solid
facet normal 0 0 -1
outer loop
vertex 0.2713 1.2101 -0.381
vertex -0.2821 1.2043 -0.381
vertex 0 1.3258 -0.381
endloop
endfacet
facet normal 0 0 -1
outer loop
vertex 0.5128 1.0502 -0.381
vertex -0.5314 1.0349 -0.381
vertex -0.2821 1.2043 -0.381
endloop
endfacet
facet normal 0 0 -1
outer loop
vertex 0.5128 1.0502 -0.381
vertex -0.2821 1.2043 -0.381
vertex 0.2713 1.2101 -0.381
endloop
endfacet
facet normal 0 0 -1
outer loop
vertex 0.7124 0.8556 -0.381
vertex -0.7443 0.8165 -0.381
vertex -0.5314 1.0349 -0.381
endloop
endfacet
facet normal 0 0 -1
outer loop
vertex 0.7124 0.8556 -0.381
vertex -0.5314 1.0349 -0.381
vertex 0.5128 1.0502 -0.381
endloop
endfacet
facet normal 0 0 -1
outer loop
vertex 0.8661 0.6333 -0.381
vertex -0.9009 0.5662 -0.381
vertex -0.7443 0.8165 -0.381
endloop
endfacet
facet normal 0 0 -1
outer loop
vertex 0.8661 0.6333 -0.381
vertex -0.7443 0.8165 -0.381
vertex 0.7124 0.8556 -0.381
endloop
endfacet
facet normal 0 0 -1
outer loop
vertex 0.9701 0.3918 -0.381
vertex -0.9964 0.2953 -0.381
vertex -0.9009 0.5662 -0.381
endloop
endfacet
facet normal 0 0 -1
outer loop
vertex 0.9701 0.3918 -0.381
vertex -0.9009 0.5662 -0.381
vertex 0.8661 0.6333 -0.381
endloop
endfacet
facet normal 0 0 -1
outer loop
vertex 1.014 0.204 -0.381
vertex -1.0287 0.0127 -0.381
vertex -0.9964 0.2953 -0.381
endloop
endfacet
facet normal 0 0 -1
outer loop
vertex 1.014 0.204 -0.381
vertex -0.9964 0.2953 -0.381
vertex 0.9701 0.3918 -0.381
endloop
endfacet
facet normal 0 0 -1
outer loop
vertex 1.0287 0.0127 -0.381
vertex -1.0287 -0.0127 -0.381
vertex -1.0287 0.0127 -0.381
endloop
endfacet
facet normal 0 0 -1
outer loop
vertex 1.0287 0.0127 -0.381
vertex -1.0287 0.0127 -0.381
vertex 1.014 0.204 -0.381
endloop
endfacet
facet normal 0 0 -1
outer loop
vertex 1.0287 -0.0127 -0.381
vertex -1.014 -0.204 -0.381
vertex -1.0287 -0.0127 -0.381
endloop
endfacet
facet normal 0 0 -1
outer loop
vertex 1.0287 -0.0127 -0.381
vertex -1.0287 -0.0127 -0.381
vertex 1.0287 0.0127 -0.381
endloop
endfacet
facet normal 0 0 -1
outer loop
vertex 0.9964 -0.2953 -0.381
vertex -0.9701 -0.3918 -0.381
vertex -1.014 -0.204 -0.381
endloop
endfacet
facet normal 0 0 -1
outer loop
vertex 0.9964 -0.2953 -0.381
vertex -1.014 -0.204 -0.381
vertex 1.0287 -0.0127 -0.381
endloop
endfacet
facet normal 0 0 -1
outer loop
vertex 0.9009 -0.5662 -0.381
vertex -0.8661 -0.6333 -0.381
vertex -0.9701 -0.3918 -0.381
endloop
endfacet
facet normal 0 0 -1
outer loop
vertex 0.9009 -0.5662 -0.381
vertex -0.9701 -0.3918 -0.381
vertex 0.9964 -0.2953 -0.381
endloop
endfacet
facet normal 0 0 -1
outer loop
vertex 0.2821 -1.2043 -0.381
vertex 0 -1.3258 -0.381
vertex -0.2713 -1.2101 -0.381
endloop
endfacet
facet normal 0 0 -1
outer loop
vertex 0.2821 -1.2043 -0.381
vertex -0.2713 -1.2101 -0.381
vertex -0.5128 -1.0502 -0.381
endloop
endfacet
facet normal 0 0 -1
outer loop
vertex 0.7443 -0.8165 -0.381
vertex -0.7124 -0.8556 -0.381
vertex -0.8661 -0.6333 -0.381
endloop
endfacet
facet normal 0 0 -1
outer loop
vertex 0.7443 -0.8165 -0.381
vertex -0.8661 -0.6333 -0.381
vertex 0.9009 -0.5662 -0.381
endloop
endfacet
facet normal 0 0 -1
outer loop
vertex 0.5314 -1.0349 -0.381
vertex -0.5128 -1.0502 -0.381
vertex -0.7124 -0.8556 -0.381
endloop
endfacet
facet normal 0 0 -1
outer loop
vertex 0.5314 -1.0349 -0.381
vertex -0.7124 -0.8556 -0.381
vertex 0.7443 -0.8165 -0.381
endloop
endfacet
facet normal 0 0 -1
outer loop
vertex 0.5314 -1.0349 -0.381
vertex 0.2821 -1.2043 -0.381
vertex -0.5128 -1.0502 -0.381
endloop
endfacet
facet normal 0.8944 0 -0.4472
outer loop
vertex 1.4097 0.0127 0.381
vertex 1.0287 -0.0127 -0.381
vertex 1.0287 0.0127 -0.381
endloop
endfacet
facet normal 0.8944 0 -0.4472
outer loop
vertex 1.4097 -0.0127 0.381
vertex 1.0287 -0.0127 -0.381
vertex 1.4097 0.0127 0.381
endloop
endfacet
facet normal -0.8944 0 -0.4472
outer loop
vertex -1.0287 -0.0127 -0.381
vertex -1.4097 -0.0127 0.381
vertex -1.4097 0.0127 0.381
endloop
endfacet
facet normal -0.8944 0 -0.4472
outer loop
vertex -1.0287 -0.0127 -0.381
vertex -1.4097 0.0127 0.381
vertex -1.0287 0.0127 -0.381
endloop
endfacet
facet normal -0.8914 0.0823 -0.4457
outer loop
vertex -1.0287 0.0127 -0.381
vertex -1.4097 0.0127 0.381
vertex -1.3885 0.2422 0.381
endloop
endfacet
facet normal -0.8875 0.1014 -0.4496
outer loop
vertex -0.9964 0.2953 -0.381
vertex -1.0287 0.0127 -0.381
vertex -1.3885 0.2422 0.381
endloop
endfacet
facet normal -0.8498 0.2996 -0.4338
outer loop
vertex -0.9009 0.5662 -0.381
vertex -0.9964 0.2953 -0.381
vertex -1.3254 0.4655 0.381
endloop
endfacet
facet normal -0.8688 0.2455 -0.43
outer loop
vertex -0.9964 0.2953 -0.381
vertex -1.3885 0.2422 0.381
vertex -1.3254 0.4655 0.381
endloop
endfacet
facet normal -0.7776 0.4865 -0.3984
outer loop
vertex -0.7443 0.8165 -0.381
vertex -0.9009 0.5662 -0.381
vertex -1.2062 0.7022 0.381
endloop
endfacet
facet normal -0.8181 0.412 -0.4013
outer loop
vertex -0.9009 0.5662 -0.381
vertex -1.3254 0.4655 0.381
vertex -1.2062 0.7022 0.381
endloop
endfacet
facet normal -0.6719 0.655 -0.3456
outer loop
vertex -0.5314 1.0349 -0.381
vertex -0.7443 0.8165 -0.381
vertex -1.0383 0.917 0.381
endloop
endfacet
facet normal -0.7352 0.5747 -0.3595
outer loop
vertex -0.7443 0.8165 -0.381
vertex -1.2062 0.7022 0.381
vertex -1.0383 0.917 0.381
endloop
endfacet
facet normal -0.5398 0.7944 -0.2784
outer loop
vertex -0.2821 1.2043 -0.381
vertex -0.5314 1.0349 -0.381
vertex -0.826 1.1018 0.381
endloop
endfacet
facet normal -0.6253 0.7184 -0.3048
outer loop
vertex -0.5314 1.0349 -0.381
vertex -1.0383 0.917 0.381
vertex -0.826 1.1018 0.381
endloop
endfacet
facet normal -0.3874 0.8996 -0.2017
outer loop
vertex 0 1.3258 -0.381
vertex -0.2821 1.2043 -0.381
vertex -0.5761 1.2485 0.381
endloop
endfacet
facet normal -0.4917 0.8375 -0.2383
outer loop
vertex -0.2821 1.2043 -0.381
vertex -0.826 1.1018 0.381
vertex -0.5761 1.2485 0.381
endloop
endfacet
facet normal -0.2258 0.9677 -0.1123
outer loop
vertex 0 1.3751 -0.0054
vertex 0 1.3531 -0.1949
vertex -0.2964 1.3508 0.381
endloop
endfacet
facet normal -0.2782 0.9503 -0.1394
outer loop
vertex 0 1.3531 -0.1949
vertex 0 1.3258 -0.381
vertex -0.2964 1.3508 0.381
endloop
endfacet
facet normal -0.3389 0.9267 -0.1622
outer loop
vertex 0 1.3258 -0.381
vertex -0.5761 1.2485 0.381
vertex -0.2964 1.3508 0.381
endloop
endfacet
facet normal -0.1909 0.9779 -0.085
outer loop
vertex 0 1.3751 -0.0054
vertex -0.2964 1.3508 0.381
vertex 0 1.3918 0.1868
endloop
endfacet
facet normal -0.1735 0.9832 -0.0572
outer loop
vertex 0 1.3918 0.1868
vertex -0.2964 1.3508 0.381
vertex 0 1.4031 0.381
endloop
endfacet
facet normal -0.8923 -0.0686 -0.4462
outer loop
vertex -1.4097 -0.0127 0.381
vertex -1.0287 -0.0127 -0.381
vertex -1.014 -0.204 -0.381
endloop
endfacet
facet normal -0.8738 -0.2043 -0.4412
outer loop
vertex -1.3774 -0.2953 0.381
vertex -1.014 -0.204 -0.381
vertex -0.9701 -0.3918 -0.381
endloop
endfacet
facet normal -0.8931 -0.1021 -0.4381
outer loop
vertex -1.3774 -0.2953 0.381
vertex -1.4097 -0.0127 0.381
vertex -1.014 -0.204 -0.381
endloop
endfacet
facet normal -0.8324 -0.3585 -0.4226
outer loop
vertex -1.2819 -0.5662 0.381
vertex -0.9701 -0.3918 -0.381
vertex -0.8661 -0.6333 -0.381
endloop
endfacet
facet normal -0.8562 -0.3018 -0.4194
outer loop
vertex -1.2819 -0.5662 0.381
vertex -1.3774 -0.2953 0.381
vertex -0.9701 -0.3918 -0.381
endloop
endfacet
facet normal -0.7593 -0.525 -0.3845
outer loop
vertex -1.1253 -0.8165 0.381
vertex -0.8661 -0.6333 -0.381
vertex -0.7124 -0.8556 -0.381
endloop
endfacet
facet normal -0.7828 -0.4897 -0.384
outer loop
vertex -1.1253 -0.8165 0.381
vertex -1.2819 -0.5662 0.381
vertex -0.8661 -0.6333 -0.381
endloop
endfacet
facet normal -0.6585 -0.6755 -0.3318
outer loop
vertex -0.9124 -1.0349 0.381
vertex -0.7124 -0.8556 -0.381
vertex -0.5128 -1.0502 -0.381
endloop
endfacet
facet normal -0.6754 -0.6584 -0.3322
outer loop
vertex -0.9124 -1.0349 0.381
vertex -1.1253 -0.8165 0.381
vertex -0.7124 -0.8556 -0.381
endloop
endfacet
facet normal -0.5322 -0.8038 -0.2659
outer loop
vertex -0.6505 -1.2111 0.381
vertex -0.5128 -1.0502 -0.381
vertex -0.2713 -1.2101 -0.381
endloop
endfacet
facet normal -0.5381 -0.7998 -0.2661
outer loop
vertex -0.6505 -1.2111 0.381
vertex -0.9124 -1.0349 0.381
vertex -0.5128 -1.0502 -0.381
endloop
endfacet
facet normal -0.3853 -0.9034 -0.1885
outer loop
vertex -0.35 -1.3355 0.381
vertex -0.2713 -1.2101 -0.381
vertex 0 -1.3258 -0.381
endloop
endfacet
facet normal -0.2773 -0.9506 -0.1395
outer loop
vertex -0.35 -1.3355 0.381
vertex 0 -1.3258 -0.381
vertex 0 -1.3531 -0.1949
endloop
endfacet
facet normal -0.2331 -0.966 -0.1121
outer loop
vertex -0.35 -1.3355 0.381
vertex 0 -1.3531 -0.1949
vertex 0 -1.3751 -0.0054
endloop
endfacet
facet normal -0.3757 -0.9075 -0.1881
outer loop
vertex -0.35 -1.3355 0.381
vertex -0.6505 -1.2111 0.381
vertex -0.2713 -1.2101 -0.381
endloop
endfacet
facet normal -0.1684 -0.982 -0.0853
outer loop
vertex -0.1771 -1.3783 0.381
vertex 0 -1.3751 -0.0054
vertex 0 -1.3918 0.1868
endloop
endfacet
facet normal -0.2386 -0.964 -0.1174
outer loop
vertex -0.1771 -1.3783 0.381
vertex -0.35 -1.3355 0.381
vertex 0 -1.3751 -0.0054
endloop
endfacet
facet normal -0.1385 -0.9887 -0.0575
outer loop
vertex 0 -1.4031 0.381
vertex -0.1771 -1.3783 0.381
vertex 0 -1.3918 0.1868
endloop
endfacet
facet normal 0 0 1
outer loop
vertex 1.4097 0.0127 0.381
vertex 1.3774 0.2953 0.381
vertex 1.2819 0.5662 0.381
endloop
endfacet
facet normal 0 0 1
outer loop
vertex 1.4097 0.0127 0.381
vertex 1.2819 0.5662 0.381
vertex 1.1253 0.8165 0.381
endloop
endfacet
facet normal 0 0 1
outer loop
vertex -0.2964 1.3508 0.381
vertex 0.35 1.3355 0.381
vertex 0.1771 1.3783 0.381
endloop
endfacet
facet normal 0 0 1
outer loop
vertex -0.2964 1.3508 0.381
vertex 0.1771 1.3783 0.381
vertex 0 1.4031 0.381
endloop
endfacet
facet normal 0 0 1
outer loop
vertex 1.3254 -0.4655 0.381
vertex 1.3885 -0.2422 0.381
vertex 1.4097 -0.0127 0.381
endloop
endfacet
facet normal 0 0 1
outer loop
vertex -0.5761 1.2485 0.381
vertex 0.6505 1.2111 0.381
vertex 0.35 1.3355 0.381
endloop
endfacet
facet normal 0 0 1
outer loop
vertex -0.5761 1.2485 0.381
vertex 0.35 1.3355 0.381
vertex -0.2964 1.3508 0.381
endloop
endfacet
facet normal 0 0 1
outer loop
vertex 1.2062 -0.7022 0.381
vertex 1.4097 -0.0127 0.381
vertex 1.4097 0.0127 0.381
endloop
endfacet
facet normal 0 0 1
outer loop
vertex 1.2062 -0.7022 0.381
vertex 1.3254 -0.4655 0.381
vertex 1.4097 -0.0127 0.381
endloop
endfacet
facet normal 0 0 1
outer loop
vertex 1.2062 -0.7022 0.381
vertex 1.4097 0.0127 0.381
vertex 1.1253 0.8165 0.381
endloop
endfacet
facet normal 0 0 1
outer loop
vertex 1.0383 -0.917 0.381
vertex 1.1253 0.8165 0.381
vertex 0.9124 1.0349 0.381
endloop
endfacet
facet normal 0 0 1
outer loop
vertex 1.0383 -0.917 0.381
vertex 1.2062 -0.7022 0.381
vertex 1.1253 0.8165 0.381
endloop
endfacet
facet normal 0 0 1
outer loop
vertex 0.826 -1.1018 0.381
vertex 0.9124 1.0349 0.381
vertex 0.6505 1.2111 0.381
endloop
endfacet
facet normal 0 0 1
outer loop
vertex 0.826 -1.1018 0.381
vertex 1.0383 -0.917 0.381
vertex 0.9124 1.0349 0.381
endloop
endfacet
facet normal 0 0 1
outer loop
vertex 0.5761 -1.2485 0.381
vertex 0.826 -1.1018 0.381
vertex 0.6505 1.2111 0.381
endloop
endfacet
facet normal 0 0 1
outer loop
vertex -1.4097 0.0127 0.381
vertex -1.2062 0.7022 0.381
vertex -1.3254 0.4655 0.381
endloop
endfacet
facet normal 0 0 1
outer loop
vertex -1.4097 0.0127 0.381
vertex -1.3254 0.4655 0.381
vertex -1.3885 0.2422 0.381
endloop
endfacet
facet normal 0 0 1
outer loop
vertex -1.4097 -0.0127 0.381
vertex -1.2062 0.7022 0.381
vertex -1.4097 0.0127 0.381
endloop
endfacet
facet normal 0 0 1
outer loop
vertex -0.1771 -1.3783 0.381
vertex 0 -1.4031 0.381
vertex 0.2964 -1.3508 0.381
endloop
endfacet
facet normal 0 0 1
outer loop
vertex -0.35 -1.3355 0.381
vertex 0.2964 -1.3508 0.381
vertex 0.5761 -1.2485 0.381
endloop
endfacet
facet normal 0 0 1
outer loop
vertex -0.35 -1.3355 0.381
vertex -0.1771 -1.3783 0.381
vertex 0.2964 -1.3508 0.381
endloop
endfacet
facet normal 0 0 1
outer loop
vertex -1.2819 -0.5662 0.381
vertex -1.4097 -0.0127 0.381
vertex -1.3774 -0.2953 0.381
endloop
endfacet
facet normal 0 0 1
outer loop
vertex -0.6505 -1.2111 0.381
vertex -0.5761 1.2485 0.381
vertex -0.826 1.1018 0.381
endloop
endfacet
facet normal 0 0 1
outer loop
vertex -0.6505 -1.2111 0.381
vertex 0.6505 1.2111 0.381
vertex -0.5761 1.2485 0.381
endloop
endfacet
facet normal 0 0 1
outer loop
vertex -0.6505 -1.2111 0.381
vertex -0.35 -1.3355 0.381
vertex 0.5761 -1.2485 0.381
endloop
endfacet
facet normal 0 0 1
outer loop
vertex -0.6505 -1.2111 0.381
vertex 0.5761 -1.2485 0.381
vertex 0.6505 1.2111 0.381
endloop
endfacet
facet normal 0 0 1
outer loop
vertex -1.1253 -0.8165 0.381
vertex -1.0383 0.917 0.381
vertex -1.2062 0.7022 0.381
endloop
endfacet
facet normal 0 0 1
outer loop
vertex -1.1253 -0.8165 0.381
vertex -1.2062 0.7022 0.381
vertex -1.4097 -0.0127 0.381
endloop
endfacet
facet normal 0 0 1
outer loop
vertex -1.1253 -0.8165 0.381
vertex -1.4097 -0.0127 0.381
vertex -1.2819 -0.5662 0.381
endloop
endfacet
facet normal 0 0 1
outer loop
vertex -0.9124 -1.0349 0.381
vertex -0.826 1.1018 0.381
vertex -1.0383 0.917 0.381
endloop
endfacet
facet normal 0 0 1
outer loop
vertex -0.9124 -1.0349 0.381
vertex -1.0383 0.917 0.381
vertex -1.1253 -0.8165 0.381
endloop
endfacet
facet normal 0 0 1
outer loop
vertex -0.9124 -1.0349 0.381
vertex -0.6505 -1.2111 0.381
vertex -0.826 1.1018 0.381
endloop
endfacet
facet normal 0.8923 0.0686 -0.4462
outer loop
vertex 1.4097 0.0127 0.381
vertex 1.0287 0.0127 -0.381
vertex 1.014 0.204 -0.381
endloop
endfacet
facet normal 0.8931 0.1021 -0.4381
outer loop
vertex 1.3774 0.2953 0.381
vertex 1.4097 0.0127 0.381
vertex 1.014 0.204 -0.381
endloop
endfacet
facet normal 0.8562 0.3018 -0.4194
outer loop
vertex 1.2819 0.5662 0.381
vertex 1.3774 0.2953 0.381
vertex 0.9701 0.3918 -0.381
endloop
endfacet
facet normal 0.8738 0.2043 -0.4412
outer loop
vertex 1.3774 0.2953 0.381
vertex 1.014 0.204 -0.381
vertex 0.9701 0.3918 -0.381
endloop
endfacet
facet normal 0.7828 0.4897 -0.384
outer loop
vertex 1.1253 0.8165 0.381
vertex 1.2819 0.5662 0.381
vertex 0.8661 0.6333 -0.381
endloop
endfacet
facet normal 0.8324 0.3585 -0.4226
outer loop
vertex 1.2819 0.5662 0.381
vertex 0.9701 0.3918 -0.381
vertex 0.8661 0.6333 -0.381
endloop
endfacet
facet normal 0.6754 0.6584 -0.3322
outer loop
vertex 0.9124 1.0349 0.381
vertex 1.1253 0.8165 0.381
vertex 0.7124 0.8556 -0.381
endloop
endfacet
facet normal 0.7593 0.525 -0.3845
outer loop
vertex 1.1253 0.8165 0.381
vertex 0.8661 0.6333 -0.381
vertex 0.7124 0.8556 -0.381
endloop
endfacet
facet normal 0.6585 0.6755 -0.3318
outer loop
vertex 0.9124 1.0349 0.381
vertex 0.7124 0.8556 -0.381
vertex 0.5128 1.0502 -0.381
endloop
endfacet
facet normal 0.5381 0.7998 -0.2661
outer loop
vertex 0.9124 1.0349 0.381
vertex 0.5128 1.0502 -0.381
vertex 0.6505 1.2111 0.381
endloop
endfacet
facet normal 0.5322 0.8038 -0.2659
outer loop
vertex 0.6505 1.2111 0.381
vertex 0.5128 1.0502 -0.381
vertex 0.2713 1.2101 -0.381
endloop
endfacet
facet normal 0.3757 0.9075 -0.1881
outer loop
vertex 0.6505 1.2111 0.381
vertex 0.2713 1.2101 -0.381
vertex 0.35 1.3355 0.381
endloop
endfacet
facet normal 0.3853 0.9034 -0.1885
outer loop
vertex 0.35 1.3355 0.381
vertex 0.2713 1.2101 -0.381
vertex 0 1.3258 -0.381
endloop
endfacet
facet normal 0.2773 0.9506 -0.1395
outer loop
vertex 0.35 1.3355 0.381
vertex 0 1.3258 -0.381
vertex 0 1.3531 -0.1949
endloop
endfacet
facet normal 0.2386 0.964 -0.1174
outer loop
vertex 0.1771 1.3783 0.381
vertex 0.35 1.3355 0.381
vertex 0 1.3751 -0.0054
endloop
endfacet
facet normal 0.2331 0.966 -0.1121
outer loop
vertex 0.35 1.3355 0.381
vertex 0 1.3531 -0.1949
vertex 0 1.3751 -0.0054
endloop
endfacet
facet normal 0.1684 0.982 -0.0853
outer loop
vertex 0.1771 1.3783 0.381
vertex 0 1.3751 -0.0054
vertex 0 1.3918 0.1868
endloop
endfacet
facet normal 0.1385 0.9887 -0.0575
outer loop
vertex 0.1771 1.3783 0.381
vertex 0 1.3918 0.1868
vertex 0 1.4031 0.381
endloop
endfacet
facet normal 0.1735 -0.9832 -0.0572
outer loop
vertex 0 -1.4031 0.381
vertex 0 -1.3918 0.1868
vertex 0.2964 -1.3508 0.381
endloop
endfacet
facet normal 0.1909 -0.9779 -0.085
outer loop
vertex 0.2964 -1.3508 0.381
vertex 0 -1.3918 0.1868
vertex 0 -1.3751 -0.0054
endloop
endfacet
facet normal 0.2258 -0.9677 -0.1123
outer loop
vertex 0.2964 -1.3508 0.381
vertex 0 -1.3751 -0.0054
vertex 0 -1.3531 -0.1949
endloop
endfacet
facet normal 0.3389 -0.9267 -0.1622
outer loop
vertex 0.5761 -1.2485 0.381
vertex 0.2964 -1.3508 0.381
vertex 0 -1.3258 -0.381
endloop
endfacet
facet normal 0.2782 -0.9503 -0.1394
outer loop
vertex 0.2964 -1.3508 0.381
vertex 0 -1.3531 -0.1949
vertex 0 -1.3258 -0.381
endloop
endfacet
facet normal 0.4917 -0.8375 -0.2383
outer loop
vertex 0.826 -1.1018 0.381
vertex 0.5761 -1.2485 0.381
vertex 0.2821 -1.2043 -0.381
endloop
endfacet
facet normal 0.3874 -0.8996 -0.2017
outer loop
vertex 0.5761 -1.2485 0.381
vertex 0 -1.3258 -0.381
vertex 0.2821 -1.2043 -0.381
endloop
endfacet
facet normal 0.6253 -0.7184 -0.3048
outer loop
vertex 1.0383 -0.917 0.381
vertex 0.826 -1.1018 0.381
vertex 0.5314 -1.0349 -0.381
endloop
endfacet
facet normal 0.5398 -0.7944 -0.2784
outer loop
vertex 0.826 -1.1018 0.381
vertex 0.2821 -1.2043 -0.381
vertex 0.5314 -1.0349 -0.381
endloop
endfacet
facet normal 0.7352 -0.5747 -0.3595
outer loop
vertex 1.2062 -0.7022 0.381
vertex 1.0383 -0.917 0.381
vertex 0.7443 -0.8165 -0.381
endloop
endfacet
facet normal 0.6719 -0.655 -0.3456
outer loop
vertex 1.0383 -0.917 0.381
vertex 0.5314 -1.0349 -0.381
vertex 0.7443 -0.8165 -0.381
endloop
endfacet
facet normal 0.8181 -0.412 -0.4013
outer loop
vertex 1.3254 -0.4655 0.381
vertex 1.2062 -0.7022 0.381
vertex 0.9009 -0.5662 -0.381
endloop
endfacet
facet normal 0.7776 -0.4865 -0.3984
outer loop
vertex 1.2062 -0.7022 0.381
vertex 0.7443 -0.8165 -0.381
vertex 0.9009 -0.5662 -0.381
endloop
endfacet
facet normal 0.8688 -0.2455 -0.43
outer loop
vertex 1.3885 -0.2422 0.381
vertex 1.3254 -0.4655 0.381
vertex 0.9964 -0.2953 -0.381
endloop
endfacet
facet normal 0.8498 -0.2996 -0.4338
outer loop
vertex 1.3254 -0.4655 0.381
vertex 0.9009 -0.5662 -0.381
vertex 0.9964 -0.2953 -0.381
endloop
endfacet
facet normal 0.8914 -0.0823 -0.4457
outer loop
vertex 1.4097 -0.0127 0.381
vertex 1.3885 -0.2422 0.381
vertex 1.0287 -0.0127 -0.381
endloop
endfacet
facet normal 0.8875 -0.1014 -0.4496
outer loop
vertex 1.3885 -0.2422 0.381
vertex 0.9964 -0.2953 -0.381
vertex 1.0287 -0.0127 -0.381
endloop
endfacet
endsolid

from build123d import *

# Parameters (mm, degrees)
F1_DEPTH    = 1.4097
F2_T1_DEPTH = 7.8369418994
F2_T3_DEPTH = 7.8369418994


# Not quite as in the source:
# - a fillet or chamfer that OpenCascade refuses, or shapes differently, is made with other operations: its cross-section is extruded or revolved along the edge and cut away or added


with BuildPart() as f1:
    # F0 (on Front) → F1 (new body, symmetric)
    with BuildSketch(Plane.XZ):
        Polygon((-1.0287, -0.381), (1.0287, -0.381), (1.4097, 0.381), (-1.4097, 0.381), align=None)
    extrude(amount=F1_DEPTH, both=True)

    # F2: fillet of radius 1.397 on 4 edges, made by hand

    # F2_s2 → F2_t1 (cut)
    with BuildSketch(Plane(origin=(-1.9962334823, 0, 3.9924669646), x_dir=(0, 1, 0), z_dir=(0.4472135955, 0, -0.894427191))):
        with BuildLine():
            ThreePointArc((0.0127, -1.0904856313), (1.0005281733, -0.6813138046), (1.4097, 0.3065143687))
            Line((1.4097, 0.3065143687), (1.4097, -1.0904856313))
            Line((1.4097, -1.0904856313), (0.0127, -1.0904856313))
        make_face()
        with BuildLine():
            ThreePointArc((-0.0127, -1.0904856313), (-1.0005281733, -0.6813138046), (-1.4097, 0.3065143687))
            Line((-1.4097, 0.3065143687), (-1.4097, -1.0904856313))
            Line((-1.4097, -1.0904856313), (-0.0127, -1.0904856313))
        make_face()
    extrude(amount=F2_T1_DEPTH, mode=Mode.SUBTRACT)

    # F2_s4 → F2_t3 (cut)
    with BuildSketch(Plane(origin=(-1.5085534823, 0, -3.0171069646), x_dir=(0, 1, 0), z_dir=(0.4472135955, 0, 0.894427191))):
        with BuildLine():
            ThreePointArc((-1.4097, 0.3065143687), (-1.0005281733, -0.6813138046), (-0.0127, -1.0904856313))
            Line((-0.0127, -1.0904856313), (-1.4097, -1.0904856313))
            Line((-1.4097, -1.0904856313), (-1.4097, 0.3065143687))
        make_face()
        with BuildLine():
            ThreePointArc((0.0127, -1.0904856313), (1.0005281733, -0.6813138046), (1.4097, 0.3065143687))
            Line((1.4097, 0.3065143687), (1.4097, -1.0904856313))
            Line((1.4097, -1.0904856313), (0.0127, -1.0904856313))
        make_face()
    extrude(amount=F2_T3_DEPTH, mode=Mode.SUBTRACT)


solid = f1.part
